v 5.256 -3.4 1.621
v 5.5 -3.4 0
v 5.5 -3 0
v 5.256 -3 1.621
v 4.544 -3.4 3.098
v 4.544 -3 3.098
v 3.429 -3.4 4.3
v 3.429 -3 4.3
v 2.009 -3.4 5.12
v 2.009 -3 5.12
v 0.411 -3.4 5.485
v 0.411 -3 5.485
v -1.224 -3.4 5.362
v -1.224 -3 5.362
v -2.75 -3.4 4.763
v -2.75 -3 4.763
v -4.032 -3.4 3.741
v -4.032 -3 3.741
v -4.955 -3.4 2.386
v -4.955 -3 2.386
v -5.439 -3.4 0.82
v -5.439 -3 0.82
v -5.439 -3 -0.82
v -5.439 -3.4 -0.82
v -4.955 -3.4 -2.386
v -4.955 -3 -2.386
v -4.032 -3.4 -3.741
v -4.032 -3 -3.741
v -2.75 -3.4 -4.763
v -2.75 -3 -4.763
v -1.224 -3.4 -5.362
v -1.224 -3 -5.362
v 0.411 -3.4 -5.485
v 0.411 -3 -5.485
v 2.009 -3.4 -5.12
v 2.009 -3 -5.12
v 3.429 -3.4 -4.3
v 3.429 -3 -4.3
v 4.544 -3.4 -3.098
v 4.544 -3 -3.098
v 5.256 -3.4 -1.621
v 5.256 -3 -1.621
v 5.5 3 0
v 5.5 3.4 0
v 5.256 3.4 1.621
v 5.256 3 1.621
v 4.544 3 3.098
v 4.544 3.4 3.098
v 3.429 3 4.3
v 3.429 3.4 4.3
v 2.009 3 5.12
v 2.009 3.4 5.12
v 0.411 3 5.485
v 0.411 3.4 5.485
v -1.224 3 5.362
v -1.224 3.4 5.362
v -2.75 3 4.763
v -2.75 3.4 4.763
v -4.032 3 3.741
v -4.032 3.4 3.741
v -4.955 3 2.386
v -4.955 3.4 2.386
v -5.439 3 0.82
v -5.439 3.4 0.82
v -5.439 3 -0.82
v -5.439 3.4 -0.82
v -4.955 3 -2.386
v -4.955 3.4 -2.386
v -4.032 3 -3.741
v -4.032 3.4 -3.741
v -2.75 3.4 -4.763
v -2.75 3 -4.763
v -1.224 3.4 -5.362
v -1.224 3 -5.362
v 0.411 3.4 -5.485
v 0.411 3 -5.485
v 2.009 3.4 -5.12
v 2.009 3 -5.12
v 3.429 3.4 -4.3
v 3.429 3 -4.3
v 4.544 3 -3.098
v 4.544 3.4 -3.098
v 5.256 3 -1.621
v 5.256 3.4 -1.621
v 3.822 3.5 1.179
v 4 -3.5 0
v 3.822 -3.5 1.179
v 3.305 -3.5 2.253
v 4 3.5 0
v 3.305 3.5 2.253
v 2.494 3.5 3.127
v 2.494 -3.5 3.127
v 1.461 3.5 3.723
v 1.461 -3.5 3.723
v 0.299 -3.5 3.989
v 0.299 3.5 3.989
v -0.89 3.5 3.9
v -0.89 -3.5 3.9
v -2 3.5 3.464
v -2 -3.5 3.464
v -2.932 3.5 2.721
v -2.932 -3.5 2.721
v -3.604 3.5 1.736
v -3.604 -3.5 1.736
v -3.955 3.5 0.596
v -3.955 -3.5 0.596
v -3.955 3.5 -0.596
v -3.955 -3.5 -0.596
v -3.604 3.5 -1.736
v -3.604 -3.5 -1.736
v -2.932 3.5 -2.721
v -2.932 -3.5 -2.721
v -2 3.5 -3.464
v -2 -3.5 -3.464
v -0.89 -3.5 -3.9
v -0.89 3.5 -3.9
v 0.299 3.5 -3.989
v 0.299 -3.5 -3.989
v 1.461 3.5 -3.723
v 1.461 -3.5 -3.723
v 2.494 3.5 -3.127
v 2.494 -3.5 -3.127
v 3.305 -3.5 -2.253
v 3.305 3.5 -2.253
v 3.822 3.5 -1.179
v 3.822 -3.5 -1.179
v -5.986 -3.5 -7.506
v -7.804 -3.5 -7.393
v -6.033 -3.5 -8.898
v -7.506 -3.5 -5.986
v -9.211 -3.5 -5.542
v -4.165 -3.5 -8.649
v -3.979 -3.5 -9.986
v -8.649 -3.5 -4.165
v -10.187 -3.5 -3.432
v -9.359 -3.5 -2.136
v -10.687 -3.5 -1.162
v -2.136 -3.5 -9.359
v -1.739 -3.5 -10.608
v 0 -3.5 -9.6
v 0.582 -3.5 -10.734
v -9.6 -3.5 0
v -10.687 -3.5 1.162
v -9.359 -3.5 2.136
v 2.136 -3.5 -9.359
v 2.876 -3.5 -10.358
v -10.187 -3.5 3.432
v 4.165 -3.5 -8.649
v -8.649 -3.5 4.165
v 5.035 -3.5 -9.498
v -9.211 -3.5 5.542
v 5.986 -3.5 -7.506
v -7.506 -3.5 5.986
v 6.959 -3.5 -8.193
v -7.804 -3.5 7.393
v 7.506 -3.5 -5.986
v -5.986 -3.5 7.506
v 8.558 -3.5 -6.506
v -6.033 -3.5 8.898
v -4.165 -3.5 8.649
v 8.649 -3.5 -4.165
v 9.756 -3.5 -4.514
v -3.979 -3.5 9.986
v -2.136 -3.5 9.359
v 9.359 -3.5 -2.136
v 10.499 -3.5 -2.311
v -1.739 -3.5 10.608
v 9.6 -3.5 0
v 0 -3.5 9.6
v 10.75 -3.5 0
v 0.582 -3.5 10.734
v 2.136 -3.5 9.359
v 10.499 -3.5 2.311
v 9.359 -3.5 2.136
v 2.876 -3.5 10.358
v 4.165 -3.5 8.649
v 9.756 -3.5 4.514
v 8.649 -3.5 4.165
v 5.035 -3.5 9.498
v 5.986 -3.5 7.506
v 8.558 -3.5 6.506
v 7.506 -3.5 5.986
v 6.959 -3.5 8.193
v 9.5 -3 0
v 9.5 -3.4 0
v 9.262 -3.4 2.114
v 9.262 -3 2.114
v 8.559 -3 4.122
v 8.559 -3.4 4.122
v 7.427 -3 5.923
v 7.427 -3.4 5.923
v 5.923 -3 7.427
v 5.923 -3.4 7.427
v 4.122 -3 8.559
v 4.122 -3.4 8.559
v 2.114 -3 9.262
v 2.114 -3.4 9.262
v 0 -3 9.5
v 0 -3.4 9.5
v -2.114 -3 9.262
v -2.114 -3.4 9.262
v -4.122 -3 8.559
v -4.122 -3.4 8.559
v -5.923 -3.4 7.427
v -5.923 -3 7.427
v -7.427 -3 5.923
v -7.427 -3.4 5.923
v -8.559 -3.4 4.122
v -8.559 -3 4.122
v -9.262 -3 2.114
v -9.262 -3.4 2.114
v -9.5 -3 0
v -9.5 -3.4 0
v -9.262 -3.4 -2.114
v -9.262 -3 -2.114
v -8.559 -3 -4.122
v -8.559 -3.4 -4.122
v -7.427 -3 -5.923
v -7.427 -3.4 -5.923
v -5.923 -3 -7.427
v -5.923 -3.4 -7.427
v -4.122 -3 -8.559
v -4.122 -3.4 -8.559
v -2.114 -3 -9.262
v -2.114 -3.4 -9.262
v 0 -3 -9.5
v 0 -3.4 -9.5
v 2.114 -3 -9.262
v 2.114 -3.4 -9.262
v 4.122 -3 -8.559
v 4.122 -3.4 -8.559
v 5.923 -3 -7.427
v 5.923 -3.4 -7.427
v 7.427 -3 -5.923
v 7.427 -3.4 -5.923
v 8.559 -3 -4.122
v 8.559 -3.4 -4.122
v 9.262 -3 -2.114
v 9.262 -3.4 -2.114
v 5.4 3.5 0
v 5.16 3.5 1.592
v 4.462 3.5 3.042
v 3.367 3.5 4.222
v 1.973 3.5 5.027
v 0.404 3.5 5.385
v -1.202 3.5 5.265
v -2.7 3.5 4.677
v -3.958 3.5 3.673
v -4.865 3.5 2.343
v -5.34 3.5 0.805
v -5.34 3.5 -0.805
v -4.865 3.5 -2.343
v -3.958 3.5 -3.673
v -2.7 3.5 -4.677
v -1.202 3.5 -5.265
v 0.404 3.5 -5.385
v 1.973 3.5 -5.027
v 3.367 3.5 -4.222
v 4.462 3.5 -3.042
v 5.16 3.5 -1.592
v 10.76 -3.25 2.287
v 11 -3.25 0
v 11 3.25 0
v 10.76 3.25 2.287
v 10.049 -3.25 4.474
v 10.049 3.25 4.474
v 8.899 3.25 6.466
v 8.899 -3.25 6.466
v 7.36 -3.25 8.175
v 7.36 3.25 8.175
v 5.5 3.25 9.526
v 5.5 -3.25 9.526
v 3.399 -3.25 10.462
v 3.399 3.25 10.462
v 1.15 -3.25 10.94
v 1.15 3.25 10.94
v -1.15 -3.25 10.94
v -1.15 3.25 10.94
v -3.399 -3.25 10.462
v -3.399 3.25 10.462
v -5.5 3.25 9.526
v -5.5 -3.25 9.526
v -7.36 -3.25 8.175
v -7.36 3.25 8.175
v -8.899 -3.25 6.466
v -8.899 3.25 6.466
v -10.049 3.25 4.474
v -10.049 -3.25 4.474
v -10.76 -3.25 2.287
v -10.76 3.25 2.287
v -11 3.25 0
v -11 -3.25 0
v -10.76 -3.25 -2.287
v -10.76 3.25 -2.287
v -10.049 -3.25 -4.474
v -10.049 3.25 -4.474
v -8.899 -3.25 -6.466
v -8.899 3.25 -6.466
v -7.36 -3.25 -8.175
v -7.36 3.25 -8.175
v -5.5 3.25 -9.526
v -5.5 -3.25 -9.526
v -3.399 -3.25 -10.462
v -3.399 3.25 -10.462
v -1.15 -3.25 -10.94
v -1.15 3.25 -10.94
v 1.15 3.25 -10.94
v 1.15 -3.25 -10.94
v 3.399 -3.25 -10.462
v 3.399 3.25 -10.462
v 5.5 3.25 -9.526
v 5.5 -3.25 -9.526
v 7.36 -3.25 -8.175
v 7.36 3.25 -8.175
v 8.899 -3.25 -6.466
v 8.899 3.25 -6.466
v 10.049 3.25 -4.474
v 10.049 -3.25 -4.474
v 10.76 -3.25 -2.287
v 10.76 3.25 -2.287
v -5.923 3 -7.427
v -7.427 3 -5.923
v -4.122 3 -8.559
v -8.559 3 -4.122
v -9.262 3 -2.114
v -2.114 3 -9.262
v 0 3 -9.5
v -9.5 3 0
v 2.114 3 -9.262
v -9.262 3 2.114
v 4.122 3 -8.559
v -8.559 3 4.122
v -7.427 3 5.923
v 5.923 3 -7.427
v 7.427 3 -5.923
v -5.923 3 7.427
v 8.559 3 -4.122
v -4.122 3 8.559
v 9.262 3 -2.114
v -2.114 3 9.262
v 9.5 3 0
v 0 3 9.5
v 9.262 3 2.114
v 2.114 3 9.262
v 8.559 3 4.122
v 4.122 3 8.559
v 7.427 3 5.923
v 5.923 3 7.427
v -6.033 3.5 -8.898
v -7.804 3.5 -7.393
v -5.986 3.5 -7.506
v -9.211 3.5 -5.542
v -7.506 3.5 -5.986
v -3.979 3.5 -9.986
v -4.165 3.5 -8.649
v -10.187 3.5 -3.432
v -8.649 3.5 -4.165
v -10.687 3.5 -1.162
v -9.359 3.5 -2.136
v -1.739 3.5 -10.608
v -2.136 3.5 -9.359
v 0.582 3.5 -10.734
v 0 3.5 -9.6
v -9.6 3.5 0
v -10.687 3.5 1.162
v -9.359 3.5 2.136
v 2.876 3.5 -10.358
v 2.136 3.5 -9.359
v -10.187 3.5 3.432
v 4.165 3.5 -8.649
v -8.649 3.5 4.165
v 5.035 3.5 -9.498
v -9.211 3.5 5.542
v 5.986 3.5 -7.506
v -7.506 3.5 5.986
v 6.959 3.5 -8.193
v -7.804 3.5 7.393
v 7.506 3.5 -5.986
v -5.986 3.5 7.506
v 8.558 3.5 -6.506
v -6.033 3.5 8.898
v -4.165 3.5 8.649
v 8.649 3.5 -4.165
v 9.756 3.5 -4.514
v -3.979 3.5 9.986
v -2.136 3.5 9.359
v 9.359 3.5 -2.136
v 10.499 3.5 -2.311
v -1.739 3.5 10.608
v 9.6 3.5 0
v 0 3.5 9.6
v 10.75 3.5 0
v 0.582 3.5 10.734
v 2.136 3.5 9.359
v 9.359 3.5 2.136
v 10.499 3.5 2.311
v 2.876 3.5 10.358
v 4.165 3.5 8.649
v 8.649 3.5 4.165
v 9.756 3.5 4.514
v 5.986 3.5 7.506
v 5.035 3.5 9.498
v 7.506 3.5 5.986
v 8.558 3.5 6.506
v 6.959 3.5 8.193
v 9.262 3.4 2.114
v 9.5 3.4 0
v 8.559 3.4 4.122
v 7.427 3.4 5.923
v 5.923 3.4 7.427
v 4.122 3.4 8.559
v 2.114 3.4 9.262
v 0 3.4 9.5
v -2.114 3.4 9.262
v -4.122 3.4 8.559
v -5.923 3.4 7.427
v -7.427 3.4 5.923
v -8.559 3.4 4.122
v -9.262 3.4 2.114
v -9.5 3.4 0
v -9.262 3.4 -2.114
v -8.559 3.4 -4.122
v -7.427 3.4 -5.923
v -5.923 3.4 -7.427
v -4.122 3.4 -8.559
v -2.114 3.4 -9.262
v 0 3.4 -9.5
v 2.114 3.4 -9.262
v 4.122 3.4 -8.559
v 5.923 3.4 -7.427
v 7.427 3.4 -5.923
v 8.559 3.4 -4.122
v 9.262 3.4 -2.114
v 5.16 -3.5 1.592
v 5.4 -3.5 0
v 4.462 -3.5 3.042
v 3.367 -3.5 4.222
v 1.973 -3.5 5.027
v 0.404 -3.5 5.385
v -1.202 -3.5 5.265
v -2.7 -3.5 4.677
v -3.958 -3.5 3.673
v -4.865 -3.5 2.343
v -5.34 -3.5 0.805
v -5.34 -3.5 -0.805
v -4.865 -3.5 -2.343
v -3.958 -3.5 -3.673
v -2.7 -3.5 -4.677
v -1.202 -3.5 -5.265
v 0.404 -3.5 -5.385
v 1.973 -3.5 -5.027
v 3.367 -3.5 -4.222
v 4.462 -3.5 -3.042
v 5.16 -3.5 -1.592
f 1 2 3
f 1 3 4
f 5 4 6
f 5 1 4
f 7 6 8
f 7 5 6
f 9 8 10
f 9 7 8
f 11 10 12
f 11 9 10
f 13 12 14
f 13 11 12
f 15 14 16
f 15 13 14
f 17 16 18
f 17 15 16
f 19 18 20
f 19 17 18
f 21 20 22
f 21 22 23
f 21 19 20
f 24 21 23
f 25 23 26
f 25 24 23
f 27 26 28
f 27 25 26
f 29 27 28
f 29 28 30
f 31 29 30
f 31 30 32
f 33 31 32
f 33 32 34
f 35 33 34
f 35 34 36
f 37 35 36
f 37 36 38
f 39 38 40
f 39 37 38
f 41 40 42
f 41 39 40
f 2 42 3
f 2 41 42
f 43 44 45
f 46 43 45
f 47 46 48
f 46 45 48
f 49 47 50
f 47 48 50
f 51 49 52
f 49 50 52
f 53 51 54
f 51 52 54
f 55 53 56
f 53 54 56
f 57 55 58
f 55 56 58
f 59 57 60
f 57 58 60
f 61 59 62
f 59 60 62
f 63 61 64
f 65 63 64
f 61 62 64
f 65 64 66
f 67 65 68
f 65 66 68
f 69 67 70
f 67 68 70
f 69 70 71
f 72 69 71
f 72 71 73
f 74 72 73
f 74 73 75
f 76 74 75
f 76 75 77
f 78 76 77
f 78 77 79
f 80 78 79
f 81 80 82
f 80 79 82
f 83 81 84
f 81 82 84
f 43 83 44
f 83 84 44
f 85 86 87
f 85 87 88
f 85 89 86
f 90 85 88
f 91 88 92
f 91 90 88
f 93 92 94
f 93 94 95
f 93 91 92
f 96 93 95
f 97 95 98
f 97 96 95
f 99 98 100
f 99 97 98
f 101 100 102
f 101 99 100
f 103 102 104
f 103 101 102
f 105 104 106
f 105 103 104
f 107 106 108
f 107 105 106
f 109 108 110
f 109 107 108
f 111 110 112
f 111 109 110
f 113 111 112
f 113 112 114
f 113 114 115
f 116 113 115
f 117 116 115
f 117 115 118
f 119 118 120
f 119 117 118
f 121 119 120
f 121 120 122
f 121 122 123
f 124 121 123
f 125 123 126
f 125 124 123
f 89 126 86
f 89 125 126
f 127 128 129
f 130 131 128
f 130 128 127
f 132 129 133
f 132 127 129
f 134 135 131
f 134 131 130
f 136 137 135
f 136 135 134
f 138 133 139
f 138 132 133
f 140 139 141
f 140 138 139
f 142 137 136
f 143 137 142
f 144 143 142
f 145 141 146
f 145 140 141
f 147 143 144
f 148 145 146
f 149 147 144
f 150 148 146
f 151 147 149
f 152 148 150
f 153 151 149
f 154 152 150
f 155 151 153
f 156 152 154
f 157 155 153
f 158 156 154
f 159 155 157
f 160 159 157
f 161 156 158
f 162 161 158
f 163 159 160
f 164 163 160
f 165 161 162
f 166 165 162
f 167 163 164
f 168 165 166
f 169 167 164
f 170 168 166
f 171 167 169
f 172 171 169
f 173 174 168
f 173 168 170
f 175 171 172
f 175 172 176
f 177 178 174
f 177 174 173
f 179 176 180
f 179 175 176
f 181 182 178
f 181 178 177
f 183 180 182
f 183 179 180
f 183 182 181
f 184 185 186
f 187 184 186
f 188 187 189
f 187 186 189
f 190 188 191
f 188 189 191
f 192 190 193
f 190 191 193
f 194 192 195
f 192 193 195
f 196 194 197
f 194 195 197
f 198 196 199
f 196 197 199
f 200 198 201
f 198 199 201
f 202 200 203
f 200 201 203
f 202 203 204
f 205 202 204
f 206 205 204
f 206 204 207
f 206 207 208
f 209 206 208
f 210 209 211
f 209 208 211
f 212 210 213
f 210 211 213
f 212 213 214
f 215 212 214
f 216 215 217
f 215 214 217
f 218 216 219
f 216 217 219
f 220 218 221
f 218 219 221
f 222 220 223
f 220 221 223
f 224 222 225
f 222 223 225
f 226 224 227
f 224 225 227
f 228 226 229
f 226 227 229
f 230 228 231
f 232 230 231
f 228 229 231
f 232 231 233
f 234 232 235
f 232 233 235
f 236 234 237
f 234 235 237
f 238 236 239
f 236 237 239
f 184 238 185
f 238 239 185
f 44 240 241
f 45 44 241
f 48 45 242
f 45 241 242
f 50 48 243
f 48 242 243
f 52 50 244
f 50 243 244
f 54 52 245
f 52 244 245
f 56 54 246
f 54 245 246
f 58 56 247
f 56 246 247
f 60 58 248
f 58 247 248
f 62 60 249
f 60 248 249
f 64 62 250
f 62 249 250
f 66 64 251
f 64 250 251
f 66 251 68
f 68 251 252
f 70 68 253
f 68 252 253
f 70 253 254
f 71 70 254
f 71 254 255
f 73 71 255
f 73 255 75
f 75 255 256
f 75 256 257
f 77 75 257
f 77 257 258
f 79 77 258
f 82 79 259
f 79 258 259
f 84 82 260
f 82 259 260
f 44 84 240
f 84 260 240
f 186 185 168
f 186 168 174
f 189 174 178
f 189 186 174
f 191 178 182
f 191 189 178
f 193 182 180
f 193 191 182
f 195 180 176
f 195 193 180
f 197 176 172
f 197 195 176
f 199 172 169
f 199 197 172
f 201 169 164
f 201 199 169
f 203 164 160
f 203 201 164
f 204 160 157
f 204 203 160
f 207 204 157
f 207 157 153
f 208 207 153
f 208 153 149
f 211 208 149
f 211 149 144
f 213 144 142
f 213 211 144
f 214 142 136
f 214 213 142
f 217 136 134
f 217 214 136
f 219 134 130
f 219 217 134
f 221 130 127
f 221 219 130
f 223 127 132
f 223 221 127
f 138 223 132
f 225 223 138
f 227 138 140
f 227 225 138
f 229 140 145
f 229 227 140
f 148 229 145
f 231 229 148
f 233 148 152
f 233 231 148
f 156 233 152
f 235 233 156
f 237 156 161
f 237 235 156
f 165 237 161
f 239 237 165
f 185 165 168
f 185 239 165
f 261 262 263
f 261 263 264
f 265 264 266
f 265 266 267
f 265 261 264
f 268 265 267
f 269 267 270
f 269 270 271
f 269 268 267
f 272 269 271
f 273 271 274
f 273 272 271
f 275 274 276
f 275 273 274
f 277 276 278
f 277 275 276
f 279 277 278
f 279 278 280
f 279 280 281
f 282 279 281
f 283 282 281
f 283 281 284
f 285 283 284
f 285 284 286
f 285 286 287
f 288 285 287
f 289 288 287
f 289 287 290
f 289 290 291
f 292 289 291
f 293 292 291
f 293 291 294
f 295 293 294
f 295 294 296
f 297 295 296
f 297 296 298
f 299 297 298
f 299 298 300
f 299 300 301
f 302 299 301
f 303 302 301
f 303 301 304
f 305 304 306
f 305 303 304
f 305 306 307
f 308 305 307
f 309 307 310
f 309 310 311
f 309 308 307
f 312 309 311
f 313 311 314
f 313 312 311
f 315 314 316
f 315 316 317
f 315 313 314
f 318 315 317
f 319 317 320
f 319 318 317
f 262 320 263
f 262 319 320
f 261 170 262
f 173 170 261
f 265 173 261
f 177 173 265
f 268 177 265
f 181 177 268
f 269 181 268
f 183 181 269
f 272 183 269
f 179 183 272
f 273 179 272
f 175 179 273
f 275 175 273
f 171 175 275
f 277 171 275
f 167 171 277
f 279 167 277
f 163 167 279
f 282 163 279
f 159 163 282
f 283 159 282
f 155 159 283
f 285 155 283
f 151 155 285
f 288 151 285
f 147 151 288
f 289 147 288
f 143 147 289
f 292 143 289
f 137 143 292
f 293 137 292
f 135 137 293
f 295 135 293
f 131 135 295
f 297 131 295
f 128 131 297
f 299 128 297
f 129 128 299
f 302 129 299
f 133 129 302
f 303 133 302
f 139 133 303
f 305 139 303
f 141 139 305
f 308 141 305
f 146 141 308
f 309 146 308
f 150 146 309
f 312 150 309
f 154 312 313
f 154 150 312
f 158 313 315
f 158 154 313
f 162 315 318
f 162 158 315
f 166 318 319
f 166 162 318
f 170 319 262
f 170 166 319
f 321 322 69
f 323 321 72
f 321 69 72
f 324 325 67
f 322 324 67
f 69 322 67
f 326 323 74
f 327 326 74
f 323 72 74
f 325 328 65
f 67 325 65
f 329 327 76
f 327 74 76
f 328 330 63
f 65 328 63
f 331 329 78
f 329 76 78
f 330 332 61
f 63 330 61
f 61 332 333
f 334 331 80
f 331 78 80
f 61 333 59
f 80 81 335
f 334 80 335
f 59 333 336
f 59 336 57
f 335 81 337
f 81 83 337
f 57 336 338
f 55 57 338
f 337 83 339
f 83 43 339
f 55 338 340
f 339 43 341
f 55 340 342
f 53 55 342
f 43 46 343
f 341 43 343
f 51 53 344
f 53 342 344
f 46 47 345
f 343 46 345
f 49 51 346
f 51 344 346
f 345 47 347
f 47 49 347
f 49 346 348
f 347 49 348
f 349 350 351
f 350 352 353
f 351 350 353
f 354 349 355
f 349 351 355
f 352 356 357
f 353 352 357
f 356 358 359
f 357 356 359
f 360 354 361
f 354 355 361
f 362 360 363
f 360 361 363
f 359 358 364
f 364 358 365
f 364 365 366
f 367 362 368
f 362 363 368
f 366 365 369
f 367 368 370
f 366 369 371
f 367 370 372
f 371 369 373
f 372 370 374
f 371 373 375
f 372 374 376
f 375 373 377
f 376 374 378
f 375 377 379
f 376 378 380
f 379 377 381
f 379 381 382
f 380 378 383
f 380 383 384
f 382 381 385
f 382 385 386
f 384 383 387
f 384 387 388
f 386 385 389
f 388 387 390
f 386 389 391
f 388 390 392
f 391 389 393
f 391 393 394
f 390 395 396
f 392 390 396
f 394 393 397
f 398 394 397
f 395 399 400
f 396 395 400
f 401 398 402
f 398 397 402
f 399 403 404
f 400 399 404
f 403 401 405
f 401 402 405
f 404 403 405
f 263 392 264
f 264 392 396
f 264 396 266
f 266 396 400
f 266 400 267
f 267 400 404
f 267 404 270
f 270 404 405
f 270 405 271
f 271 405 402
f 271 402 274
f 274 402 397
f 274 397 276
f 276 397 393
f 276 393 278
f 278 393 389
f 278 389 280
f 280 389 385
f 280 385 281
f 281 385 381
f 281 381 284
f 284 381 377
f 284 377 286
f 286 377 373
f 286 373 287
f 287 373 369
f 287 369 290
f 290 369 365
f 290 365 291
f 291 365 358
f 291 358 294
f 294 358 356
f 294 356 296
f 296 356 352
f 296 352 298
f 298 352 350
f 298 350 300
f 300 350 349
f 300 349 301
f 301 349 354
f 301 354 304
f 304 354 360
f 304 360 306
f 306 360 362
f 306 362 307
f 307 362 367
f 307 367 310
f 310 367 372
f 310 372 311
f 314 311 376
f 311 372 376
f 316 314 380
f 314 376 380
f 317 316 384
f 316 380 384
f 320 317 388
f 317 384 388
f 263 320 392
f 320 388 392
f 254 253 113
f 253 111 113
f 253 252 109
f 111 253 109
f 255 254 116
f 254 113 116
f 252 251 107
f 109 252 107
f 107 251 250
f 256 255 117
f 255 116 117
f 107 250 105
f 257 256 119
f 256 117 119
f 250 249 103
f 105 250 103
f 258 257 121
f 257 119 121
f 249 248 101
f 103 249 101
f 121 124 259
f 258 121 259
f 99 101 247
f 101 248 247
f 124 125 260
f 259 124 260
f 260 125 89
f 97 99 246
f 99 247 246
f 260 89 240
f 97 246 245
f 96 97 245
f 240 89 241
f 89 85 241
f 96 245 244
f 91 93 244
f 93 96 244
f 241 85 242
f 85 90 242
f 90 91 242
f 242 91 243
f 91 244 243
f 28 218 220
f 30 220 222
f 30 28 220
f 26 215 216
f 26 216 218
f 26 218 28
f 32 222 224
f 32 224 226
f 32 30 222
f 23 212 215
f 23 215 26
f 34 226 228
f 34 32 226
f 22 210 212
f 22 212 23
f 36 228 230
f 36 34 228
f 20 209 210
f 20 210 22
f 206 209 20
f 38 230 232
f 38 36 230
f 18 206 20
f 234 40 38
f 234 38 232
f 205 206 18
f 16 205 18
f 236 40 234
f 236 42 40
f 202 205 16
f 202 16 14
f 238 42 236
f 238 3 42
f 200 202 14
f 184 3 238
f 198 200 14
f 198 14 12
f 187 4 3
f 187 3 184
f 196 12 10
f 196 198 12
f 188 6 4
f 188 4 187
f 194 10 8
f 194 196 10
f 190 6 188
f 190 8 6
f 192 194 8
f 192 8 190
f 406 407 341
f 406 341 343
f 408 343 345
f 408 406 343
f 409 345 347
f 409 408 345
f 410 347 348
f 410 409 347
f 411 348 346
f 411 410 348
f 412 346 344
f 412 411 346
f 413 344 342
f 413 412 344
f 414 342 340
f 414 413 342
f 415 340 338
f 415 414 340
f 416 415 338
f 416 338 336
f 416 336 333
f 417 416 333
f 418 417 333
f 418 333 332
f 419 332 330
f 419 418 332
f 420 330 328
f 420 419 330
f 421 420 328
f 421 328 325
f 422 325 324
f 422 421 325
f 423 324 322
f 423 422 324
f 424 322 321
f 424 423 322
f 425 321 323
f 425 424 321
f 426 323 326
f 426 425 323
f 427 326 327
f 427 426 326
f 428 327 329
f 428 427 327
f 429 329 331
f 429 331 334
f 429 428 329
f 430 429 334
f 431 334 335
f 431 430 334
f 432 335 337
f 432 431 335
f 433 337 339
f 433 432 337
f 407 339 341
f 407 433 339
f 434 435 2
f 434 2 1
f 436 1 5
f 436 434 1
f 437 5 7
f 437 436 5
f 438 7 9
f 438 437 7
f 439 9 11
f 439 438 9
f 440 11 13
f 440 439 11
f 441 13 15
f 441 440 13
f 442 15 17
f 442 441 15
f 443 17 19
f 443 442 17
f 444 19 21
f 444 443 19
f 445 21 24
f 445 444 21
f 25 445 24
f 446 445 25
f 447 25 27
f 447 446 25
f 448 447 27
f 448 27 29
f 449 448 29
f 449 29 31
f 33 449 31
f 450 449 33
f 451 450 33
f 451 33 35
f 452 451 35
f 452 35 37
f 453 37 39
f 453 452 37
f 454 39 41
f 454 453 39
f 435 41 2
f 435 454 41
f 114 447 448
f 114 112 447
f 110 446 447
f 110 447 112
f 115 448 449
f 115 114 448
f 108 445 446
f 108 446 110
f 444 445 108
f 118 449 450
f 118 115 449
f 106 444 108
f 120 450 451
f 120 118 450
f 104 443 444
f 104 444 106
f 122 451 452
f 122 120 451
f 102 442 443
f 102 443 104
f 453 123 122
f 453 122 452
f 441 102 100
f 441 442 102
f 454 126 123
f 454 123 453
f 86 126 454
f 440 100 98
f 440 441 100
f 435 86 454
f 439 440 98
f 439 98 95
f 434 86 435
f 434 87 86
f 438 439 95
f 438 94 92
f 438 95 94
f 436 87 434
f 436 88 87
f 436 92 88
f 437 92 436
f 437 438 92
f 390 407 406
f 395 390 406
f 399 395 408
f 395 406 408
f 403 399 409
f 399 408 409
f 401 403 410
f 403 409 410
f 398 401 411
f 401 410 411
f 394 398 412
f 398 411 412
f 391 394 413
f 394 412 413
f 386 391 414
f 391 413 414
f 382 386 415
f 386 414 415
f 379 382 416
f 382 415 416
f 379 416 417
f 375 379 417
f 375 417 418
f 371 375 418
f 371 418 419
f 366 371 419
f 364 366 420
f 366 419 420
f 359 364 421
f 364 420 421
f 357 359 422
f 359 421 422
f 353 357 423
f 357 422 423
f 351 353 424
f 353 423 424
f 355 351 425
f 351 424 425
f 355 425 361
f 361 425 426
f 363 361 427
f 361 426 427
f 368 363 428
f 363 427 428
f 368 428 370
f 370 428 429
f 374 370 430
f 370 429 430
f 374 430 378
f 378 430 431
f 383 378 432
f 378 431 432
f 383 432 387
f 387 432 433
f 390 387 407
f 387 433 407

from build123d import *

# Parameters (mm, degrees)
F0_R     = 11
F0_R_2   = 4
F1_DEPTH = 3.5
F2_R     = 9.5
F2_R_2   = 5.5
F3_DEPTH = 0.5
F4_SIZE  = 0.25
F5_SIZE  = 0.1


# Not quite as in the source:
# - a pattern or mirror of a feature is missing from the dataset's text; its kind, count and spacing are read off the source's solid


with BuildPart() as f1:
    # F0 (on Front) → F1 (new body, symmetric)
    with BuildSketch(Plane.XZ):
        Circle(F0_R)
        Circle(F0_R_2, mode=Mode.SUBTRACT)
    extrude(amount=F1_DEPTH, both=True)

    # F2 (on face) → F3 (cut)
    with BuildSketch(Plane.XZ.offset(3.5)):
        Circle(F2_R)
        Circle(F2_R_2, mode=Mode.SUBTRACT)
    f3 = extrude(amount=-F3_DEPTH, mode=Mode.SUBTRACT)

    # F3_copies: F3 across plane
    add(f3.mirror(Plane.ZX), mode=Mode.SUBTRACT)

    # F4
    f4_edges = [f1.edges().sort_by_distance(p)[0] for p in [
        (-11, -3.5, 0),
        (-11, 3.5, 0),
    ]]
    chamfer(f4_edges, length=F4_SIZE)

    # F5
    f5_edges = [f1.edges().sort_by_distance(p)[0] for p in [
        (-9.5, -3.5, 0),
        (-5.5, -3.5, 0),
        (-9.5, 3.5, 0),
        (-5.5, 3.5, 0),
    ]]
    chamfer(f5_edges, length=F5_SIZE)


solid = f1.part
